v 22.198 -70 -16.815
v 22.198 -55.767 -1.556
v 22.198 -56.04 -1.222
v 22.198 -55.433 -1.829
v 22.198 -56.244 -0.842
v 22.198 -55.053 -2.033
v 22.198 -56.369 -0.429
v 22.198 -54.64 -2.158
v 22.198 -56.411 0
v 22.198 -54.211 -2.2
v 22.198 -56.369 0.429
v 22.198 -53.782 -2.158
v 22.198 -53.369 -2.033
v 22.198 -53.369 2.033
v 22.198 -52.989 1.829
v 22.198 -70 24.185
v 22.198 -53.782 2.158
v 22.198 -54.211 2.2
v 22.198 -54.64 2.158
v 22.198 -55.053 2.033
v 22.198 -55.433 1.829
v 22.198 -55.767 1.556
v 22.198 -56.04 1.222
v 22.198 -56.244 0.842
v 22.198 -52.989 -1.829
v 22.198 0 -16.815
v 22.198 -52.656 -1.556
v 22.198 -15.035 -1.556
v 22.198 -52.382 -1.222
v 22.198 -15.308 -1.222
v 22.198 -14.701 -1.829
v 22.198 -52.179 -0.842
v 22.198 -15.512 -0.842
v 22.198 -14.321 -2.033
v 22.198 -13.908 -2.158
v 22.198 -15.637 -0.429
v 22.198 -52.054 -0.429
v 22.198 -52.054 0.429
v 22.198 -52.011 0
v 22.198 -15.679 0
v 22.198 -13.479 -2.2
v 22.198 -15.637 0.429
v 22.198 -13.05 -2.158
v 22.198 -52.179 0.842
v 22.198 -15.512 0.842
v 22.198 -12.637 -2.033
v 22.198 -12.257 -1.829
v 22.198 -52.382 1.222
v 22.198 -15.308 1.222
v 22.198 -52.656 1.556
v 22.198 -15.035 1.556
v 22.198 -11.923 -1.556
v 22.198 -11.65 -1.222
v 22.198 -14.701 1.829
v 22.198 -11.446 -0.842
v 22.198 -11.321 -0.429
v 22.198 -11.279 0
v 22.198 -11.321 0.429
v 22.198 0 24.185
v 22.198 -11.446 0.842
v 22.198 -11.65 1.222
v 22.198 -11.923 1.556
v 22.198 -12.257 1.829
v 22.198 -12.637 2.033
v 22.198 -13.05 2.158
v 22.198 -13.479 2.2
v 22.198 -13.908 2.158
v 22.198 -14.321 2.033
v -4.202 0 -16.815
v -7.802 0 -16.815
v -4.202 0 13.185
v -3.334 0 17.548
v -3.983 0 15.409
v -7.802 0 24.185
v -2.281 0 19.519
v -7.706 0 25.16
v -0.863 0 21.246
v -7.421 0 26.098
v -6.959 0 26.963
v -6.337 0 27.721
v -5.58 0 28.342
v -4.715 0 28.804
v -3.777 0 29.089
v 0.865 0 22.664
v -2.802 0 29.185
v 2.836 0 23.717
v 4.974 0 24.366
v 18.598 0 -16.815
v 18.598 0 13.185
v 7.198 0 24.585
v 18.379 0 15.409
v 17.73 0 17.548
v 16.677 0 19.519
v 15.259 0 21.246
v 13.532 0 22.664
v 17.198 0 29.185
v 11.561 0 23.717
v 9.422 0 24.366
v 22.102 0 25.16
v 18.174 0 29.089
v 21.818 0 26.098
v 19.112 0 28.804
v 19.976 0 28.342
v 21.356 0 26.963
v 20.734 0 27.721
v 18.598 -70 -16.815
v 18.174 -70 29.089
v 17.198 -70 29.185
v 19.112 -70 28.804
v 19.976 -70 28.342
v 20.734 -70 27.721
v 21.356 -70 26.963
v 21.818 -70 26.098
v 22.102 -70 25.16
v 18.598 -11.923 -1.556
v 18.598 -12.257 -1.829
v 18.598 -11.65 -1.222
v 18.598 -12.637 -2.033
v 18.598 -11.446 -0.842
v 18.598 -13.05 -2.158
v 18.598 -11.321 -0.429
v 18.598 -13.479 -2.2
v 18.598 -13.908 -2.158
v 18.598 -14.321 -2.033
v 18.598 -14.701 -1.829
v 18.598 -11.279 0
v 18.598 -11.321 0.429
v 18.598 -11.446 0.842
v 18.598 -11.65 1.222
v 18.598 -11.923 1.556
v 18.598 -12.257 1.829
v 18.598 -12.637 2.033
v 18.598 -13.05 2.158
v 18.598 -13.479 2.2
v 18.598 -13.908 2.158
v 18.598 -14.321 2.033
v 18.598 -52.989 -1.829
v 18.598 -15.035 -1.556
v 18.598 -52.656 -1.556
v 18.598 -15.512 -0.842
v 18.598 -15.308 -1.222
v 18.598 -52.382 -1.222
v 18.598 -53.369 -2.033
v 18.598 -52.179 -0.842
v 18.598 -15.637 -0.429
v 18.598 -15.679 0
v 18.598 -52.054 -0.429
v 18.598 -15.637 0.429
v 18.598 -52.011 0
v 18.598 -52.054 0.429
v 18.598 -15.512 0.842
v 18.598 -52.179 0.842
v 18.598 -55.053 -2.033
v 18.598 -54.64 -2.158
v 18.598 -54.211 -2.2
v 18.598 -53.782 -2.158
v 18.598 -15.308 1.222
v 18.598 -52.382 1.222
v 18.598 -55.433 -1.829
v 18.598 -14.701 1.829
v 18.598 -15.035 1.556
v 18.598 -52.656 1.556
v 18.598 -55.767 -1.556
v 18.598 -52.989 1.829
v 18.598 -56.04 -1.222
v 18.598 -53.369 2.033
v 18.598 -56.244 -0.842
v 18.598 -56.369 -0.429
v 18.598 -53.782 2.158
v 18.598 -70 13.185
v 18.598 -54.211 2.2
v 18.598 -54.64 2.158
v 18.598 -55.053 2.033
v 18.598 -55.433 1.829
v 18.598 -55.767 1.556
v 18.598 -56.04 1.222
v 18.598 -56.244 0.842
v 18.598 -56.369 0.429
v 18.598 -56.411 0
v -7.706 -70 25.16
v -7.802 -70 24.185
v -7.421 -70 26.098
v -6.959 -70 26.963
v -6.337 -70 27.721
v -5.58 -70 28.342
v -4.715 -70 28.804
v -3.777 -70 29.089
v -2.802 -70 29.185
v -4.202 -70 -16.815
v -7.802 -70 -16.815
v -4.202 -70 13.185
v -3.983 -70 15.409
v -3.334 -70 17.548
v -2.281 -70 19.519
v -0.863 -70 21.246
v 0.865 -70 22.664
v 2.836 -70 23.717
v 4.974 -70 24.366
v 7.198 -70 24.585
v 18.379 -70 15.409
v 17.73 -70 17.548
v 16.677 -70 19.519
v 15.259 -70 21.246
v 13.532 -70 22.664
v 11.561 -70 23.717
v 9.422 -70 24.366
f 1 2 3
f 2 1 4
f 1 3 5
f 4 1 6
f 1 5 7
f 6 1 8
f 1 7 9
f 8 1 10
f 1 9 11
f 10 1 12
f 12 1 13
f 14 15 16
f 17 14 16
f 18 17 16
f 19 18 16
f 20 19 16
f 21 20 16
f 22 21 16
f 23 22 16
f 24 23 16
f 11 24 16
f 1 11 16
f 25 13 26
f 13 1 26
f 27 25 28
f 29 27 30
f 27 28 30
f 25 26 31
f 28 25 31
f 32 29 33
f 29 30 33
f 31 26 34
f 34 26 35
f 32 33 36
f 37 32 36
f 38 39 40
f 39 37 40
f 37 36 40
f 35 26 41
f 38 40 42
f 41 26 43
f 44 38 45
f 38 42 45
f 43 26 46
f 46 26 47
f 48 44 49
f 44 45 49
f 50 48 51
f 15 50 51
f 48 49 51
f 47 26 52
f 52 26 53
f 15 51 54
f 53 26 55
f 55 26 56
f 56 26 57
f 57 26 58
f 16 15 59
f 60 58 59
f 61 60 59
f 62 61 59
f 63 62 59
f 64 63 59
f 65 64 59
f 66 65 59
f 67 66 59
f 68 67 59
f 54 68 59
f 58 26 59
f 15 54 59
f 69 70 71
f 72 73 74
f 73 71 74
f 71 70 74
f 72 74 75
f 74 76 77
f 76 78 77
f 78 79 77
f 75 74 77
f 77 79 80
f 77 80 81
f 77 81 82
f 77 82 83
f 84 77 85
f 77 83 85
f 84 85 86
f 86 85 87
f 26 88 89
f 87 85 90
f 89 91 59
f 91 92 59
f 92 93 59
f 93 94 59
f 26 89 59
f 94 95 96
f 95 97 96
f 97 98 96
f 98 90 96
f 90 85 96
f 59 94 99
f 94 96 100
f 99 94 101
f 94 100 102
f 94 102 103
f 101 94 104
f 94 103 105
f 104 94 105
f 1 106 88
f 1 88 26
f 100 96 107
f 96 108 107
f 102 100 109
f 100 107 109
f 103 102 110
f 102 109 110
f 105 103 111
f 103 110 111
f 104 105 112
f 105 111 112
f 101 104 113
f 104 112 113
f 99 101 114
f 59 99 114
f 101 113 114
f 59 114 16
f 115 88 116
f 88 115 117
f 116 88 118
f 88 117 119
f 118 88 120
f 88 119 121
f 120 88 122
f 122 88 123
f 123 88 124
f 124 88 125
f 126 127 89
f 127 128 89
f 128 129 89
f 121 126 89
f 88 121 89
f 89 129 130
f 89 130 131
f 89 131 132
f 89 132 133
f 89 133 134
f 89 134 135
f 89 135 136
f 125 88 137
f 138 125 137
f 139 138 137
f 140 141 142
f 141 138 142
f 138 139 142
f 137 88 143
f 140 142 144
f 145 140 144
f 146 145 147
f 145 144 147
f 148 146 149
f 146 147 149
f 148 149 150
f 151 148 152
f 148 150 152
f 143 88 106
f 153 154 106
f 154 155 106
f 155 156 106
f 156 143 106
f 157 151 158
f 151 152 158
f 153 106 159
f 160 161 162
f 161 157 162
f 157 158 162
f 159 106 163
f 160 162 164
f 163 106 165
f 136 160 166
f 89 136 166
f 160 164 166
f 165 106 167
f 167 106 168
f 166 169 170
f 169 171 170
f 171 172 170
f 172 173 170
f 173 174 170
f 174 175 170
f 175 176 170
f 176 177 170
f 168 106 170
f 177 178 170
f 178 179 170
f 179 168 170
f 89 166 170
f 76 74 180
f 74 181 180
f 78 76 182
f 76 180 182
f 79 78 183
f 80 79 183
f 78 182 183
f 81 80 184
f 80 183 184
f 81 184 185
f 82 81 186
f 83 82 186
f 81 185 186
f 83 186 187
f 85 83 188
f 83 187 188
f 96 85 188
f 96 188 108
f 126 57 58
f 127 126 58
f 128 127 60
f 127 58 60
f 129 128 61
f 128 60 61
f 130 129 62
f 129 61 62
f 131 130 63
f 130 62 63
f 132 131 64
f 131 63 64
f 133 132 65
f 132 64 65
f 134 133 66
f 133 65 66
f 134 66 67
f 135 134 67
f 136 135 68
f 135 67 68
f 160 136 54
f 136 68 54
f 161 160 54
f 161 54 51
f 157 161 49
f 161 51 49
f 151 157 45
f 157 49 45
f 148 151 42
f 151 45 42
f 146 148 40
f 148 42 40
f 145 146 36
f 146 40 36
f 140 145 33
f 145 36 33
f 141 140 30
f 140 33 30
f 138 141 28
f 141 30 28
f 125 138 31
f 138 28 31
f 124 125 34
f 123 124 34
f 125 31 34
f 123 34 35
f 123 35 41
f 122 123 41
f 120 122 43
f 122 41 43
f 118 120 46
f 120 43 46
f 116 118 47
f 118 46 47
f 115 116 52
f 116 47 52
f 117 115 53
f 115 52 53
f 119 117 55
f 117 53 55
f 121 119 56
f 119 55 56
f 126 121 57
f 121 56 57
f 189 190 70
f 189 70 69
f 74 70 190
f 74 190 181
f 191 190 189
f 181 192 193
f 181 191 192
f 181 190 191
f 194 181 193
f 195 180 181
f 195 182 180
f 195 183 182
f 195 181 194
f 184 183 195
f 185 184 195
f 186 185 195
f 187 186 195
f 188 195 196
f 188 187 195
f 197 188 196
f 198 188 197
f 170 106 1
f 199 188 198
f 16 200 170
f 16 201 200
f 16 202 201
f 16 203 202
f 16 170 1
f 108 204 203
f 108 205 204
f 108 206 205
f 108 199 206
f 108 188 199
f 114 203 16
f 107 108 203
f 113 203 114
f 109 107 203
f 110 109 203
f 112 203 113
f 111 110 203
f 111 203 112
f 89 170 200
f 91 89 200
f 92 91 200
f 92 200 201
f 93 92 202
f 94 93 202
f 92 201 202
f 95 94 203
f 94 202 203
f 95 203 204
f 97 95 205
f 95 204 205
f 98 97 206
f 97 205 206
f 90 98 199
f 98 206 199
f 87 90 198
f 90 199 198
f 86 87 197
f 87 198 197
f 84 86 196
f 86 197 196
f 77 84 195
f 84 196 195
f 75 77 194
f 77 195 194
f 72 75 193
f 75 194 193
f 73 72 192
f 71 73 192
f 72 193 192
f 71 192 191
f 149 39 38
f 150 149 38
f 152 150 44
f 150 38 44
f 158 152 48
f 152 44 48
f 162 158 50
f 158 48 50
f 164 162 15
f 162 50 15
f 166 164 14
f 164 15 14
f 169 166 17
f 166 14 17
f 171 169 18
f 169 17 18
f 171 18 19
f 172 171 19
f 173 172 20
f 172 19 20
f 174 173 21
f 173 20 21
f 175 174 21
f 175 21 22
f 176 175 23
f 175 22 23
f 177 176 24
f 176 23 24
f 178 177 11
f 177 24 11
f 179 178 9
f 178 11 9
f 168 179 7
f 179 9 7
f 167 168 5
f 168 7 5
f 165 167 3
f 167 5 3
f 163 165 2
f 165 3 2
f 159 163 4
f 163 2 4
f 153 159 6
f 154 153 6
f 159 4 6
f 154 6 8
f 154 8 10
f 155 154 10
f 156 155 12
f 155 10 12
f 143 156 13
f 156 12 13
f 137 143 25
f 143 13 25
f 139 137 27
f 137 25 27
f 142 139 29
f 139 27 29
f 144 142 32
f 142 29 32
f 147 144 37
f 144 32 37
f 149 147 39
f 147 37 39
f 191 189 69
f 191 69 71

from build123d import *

# Parameters (mm, degrees)
F0_W     = 30
F0_H     = 46
F1_DEPTH = 70
F2_W     = 22.8
F2_H     = 30
F3_DEPTH = 70
F4_R     = 2.2
F5_DEPTH = 3.6
F6_R     = 5


with BuildPart() as f1:
    # F0 (on Front) → F1 (new body)
    with BuildSketch(Plane.XZ):
        with Locations((7.198161, 6.185042)):
            Rectangle(F0_W, F0_H)
    extrude(amount=F1_DEPTH)

    # F2 (on face) → F3 (cut)
    with BuildSketch(Plane.XZ.offset(70)):
        with BuildLine():
            ThreePointArc((18.598161, 13.185042), (7.198161, 24.585042), (-4.201839, 13.185042))
            Line((-4.201839, 13.185042), (18.598161, 13.185042))
        make_face()
        with Locations((7.198161, -1.814958)):
            Rectangle(F2_W, F2_H)
    extrude(amount=-F3_DEPTH, mode=Mode.SUBTRACT)

    # F4 (on face) → F5 (cut, through all)
    with BuildSketch(Plane.YZ.offset(22.198161)):
        with Locations((-54.21123, 0)):
            Circle(F4_R)
        with Locations((-13.479018, 0)):
            Circle(F4_R)
    extrude(amount=-F5_DEPTH, mode=Mode.SUBTRACT)

    # F6
    f6_edges = [f1.edges().sort_by_distance(p)[0] for p in [
        (-7.801839, -35, 29.185042),
        (22.198161, -35, 29.185042),
    ]]
    fillet(f6_edges, radius=F6_R)


solid = f1.part
